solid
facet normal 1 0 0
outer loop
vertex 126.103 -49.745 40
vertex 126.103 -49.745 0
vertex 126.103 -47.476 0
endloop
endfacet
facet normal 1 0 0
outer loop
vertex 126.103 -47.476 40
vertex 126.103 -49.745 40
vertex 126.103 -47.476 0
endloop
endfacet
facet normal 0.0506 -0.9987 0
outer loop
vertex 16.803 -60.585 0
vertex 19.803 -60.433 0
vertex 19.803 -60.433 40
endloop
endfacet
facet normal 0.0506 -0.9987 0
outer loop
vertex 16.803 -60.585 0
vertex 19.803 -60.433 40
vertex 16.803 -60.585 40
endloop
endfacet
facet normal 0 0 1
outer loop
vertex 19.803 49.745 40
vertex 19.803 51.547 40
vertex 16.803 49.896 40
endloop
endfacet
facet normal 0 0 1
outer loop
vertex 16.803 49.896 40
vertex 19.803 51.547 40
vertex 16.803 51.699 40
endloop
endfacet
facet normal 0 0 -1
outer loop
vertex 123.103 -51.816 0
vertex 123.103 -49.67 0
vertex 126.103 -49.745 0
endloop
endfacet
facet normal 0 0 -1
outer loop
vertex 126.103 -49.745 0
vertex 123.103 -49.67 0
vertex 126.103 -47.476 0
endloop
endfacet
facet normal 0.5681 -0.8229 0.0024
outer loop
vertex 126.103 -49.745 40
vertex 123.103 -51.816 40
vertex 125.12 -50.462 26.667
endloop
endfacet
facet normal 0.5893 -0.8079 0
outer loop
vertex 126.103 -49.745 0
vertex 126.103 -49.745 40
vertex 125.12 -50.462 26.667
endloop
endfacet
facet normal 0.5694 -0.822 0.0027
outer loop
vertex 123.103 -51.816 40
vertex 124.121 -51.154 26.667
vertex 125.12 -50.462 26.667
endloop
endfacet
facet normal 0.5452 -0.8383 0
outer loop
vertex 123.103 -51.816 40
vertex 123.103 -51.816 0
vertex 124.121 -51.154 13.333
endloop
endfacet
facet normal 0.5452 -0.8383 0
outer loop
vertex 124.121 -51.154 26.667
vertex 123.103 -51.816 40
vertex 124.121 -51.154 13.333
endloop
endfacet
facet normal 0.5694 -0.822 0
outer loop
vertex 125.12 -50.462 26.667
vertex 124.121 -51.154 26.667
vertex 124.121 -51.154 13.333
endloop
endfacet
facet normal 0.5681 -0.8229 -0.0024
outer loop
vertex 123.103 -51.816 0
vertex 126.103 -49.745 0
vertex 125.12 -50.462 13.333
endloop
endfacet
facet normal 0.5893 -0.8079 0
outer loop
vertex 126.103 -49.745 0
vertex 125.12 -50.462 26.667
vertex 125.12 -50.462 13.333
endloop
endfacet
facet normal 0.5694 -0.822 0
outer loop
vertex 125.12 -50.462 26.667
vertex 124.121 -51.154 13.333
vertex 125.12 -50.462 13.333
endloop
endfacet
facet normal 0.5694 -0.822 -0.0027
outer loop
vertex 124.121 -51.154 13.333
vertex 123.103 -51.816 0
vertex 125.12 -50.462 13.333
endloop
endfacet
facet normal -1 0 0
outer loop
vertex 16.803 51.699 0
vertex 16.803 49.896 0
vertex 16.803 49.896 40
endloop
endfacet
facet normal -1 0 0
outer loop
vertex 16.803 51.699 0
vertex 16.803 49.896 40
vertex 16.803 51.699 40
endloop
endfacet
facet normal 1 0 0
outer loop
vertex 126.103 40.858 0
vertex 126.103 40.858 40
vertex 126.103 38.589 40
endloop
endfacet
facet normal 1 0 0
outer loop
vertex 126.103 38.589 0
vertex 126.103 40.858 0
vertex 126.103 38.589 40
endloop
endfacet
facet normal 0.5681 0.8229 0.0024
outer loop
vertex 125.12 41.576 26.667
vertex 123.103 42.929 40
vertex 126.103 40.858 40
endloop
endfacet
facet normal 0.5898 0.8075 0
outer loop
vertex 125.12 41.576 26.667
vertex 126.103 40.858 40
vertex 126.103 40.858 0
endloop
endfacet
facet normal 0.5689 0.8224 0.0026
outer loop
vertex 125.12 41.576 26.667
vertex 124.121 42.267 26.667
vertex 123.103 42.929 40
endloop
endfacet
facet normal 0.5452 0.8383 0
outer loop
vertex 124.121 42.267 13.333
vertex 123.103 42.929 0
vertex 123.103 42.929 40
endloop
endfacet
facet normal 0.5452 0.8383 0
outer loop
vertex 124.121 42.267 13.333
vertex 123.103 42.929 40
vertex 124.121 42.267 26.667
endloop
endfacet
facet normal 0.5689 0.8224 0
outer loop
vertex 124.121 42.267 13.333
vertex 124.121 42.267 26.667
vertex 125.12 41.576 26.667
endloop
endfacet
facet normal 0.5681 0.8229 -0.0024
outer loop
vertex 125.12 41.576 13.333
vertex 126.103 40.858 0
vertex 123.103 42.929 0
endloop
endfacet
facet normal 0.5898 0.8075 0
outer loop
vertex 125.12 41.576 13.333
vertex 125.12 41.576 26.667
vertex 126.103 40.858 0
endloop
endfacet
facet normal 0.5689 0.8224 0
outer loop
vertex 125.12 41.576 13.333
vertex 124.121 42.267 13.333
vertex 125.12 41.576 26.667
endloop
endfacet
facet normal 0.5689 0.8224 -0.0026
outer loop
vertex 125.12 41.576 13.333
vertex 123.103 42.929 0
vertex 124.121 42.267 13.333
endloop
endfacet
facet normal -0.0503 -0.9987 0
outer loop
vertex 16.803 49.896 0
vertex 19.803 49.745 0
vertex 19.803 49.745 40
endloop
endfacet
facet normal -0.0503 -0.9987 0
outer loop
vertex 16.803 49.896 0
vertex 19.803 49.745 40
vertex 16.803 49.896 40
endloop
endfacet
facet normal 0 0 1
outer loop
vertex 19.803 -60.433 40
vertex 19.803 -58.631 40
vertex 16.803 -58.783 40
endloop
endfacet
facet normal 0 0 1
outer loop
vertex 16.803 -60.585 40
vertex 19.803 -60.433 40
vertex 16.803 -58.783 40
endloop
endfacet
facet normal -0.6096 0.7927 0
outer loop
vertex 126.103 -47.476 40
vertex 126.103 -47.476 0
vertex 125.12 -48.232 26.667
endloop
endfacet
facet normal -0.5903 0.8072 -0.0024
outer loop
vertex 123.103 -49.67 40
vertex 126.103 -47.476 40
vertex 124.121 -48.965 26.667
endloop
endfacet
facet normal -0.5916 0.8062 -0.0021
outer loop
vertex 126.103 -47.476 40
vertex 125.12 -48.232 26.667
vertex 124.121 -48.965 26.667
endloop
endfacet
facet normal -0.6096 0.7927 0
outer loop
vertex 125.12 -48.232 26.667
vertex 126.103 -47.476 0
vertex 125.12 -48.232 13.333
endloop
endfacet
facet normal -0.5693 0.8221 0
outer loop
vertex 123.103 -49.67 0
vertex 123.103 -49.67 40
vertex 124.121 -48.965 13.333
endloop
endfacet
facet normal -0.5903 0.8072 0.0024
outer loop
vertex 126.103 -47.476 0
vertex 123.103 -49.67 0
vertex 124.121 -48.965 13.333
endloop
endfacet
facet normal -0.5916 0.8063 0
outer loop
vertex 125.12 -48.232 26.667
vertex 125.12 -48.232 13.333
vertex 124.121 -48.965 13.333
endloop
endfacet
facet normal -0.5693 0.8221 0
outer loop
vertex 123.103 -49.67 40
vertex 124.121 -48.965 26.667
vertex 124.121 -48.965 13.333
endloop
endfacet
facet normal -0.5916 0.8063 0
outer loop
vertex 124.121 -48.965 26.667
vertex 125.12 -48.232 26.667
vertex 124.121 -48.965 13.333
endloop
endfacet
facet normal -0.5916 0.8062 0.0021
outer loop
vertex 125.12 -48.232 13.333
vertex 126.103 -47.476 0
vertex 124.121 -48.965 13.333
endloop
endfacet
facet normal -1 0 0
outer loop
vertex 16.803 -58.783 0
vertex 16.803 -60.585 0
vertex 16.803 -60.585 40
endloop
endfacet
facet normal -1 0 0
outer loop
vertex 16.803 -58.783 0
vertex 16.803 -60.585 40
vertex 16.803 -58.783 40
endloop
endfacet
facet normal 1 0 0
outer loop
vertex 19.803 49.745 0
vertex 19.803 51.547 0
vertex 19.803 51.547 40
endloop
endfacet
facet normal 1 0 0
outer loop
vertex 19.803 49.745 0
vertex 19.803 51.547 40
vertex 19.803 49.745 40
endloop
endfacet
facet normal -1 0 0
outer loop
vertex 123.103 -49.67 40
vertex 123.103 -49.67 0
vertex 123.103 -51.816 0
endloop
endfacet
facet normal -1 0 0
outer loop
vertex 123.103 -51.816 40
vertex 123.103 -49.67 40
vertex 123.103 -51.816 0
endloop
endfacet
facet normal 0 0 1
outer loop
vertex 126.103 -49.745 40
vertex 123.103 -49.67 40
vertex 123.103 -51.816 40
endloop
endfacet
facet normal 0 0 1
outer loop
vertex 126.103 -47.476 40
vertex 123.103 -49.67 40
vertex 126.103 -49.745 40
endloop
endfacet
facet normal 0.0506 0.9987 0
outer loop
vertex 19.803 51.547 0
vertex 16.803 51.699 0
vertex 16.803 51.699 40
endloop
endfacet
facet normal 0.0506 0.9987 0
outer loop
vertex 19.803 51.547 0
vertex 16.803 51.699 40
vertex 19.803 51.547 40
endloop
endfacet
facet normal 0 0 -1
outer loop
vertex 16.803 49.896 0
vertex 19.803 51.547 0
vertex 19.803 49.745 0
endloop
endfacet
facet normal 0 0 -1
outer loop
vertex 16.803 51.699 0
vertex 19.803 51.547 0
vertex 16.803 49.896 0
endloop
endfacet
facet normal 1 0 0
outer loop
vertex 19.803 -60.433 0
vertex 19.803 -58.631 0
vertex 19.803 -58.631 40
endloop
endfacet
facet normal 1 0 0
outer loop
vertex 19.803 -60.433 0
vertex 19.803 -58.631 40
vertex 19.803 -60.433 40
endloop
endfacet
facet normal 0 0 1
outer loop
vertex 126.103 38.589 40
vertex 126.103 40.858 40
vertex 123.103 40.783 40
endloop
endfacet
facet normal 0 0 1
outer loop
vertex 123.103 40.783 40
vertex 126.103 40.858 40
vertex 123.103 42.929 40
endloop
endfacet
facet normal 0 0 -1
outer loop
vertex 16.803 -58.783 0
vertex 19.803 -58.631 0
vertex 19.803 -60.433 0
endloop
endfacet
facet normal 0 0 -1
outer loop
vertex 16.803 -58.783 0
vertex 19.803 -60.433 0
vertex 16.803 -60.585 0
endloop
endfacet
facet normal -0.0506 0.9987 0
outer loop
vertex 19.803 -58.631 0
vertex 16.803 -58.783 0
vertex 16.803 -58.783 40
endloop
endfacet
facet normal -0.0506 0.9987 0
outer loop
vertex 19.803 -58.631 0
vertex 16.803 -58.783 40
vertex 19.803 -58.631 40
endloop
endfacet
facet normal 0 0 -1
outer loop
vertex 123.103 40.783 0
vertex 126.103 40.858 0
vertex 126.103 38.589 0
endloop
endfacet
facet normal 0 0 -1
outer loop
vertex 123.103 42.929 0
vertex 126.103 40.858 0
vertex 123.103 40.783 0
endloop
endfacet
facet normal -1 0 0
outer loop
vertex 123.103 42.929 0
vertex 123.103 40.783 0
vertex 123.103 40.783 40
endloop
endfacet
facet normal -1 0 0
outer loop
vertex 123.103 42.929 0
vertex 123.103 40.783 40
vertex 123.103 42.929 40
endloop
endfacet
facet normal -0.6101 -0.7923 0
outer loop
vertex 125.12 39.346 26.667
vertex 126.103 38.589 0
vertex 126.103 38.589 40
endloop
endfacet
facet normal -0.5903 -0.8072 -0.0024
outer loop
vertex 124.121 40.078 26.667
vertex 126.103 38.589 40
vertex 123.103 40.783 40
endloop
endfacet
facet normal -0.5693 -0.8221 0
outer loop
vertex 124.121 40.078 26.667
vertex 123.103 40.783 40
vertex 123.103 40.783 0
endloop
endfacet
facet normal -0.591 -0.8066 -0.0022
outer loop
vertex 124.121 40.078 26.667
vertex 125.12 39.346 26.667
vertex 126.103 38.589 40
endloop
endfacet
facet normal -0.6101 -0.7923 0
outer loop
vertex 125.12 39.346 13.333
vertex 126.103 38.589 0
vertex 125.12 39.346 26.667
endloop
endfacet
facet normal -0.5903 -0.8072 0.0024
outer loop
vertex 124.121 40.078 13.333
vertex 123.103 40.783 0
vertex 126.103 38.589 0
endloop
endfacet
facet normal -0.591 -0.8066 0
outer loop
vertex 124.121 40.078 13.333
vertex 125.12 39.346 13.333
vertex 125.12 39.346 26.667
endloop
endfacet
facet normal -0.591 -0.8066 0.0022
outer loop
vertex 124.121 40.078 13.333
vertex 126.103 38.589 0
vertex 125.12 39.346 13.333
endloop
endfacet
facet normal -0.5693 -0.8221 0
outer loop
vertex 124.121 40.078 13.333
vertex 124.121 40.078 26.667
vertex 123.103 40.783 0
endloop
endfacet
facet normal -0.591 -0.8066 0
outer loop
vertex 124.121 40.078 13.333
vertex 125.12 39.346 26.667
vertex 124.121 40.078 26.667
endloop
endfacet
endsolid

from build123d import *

# Parameters (mm, degrees)
BOSS_EXTRUDE1_DEPTH   = 40
BOSS_EXTRUDE1_2_DEPTH = 40
BOSS_EXTRUDE1_3_DEPTH = 40
BOSS_EXTRUDE1_4_DEPTH = 40


with BuildPart() as part:
    # Sketch2 → Boss-Extrude1 (new body)
    with BuildSketch(Plane.XY):
        with BuildLine():
            Line((123.102606631, -49.669698543), (123.102606631, -51.815505395))
            add(Edge.make_bspline(
                [(123.102606631, -51.815505395), (124.131312479, -51.169734334), (125.127954038, -50.474249112), (126.102606631, -49.744671044)],
                knots=[0.757538637, 0.757538637, 0.757538637, 0.757538637, 1, 1, 1, 1], degree=3))
            Line((126.102606631, -49.744671044), (126.102606631, -47.475709013))
            add(Edge.make_bspline(
                [(126.102606631, -47.475709013), (125.126920541, -48.242489739), (124.131030901, -48.97981269), (123.102606631, -49.669698543)],
                knots=[0, 0, 0, 0, 0.241038019, 0.241038019, 0.241038019, 0.241038019], degree=3))
        make_face()
    extrude(amount=BOSS_EXTRUDE1_DEPTH)


with BuildPart() as body_2:
    # Sketch2 → Boss-Extrude1 2 (new body)
    with BuildSketch(Plane.XY):
        with BuildLine():
            Line((123.102606631, 40.783442618), (123.102606631, 42.929249471))
            add(Edge.make_bspline(
                [(123.102606631, 42.929249471), (124.131312479, 42.28347841), (125.127954038, 41.587993188), (126.102606631, 40.85841512)],
                knots=[0.757538637, 0.757538637, 0.757538637, 0.757538637, 1, 1, 1, 1], degree=3))
            Line((126.102606631, 40.85841512), (126.102606633, 38.58945309))
            add(Edge.make_bspline(
                [(126.102606633, 38.58945309), (125.126920542, 39.356233816), (124.131030901, 40.093556766), (123.102606631, 40.783442618)],
                knots=[0, 0, 0, 0, 0.241038019, 0.241038019, 0.241038019, 0.241038019], degree=3))
        make_face()
    extrude(amount=BOSS_EXTRUDE1_2_DEPTH)


with BuildPart() as body_3:
    # Sketch2 → Boss-Extrude1 3 (new body)
    with BuildSketch(Plane.XY):
        Polygon((19.802606635, -58.631013225), (19.802606635, -60.43331094), (16.802606635, -60.584941464), (16.802606635, -58.782643749), align=None)
    extrude(amount=BOSS_EXTRUDE1_3_DEPTH)


with BuildPart() as body_4:
    # Sketch2 → Boss-Extrude1 4 (new body)
    with BuildSketch(Plane.XY):
        Polygon((19.802606635, 49.744757301), (16.802606635, 49.896387825), (16.802606635, 51.69868554), (19.802606635, 51.547055016), align=None)
    extrude(amount=BOSS_EXTRUDE1_4_DEPTH)


solid = Compound([part.part, body_2.part, body_3.part, body_4.part])
